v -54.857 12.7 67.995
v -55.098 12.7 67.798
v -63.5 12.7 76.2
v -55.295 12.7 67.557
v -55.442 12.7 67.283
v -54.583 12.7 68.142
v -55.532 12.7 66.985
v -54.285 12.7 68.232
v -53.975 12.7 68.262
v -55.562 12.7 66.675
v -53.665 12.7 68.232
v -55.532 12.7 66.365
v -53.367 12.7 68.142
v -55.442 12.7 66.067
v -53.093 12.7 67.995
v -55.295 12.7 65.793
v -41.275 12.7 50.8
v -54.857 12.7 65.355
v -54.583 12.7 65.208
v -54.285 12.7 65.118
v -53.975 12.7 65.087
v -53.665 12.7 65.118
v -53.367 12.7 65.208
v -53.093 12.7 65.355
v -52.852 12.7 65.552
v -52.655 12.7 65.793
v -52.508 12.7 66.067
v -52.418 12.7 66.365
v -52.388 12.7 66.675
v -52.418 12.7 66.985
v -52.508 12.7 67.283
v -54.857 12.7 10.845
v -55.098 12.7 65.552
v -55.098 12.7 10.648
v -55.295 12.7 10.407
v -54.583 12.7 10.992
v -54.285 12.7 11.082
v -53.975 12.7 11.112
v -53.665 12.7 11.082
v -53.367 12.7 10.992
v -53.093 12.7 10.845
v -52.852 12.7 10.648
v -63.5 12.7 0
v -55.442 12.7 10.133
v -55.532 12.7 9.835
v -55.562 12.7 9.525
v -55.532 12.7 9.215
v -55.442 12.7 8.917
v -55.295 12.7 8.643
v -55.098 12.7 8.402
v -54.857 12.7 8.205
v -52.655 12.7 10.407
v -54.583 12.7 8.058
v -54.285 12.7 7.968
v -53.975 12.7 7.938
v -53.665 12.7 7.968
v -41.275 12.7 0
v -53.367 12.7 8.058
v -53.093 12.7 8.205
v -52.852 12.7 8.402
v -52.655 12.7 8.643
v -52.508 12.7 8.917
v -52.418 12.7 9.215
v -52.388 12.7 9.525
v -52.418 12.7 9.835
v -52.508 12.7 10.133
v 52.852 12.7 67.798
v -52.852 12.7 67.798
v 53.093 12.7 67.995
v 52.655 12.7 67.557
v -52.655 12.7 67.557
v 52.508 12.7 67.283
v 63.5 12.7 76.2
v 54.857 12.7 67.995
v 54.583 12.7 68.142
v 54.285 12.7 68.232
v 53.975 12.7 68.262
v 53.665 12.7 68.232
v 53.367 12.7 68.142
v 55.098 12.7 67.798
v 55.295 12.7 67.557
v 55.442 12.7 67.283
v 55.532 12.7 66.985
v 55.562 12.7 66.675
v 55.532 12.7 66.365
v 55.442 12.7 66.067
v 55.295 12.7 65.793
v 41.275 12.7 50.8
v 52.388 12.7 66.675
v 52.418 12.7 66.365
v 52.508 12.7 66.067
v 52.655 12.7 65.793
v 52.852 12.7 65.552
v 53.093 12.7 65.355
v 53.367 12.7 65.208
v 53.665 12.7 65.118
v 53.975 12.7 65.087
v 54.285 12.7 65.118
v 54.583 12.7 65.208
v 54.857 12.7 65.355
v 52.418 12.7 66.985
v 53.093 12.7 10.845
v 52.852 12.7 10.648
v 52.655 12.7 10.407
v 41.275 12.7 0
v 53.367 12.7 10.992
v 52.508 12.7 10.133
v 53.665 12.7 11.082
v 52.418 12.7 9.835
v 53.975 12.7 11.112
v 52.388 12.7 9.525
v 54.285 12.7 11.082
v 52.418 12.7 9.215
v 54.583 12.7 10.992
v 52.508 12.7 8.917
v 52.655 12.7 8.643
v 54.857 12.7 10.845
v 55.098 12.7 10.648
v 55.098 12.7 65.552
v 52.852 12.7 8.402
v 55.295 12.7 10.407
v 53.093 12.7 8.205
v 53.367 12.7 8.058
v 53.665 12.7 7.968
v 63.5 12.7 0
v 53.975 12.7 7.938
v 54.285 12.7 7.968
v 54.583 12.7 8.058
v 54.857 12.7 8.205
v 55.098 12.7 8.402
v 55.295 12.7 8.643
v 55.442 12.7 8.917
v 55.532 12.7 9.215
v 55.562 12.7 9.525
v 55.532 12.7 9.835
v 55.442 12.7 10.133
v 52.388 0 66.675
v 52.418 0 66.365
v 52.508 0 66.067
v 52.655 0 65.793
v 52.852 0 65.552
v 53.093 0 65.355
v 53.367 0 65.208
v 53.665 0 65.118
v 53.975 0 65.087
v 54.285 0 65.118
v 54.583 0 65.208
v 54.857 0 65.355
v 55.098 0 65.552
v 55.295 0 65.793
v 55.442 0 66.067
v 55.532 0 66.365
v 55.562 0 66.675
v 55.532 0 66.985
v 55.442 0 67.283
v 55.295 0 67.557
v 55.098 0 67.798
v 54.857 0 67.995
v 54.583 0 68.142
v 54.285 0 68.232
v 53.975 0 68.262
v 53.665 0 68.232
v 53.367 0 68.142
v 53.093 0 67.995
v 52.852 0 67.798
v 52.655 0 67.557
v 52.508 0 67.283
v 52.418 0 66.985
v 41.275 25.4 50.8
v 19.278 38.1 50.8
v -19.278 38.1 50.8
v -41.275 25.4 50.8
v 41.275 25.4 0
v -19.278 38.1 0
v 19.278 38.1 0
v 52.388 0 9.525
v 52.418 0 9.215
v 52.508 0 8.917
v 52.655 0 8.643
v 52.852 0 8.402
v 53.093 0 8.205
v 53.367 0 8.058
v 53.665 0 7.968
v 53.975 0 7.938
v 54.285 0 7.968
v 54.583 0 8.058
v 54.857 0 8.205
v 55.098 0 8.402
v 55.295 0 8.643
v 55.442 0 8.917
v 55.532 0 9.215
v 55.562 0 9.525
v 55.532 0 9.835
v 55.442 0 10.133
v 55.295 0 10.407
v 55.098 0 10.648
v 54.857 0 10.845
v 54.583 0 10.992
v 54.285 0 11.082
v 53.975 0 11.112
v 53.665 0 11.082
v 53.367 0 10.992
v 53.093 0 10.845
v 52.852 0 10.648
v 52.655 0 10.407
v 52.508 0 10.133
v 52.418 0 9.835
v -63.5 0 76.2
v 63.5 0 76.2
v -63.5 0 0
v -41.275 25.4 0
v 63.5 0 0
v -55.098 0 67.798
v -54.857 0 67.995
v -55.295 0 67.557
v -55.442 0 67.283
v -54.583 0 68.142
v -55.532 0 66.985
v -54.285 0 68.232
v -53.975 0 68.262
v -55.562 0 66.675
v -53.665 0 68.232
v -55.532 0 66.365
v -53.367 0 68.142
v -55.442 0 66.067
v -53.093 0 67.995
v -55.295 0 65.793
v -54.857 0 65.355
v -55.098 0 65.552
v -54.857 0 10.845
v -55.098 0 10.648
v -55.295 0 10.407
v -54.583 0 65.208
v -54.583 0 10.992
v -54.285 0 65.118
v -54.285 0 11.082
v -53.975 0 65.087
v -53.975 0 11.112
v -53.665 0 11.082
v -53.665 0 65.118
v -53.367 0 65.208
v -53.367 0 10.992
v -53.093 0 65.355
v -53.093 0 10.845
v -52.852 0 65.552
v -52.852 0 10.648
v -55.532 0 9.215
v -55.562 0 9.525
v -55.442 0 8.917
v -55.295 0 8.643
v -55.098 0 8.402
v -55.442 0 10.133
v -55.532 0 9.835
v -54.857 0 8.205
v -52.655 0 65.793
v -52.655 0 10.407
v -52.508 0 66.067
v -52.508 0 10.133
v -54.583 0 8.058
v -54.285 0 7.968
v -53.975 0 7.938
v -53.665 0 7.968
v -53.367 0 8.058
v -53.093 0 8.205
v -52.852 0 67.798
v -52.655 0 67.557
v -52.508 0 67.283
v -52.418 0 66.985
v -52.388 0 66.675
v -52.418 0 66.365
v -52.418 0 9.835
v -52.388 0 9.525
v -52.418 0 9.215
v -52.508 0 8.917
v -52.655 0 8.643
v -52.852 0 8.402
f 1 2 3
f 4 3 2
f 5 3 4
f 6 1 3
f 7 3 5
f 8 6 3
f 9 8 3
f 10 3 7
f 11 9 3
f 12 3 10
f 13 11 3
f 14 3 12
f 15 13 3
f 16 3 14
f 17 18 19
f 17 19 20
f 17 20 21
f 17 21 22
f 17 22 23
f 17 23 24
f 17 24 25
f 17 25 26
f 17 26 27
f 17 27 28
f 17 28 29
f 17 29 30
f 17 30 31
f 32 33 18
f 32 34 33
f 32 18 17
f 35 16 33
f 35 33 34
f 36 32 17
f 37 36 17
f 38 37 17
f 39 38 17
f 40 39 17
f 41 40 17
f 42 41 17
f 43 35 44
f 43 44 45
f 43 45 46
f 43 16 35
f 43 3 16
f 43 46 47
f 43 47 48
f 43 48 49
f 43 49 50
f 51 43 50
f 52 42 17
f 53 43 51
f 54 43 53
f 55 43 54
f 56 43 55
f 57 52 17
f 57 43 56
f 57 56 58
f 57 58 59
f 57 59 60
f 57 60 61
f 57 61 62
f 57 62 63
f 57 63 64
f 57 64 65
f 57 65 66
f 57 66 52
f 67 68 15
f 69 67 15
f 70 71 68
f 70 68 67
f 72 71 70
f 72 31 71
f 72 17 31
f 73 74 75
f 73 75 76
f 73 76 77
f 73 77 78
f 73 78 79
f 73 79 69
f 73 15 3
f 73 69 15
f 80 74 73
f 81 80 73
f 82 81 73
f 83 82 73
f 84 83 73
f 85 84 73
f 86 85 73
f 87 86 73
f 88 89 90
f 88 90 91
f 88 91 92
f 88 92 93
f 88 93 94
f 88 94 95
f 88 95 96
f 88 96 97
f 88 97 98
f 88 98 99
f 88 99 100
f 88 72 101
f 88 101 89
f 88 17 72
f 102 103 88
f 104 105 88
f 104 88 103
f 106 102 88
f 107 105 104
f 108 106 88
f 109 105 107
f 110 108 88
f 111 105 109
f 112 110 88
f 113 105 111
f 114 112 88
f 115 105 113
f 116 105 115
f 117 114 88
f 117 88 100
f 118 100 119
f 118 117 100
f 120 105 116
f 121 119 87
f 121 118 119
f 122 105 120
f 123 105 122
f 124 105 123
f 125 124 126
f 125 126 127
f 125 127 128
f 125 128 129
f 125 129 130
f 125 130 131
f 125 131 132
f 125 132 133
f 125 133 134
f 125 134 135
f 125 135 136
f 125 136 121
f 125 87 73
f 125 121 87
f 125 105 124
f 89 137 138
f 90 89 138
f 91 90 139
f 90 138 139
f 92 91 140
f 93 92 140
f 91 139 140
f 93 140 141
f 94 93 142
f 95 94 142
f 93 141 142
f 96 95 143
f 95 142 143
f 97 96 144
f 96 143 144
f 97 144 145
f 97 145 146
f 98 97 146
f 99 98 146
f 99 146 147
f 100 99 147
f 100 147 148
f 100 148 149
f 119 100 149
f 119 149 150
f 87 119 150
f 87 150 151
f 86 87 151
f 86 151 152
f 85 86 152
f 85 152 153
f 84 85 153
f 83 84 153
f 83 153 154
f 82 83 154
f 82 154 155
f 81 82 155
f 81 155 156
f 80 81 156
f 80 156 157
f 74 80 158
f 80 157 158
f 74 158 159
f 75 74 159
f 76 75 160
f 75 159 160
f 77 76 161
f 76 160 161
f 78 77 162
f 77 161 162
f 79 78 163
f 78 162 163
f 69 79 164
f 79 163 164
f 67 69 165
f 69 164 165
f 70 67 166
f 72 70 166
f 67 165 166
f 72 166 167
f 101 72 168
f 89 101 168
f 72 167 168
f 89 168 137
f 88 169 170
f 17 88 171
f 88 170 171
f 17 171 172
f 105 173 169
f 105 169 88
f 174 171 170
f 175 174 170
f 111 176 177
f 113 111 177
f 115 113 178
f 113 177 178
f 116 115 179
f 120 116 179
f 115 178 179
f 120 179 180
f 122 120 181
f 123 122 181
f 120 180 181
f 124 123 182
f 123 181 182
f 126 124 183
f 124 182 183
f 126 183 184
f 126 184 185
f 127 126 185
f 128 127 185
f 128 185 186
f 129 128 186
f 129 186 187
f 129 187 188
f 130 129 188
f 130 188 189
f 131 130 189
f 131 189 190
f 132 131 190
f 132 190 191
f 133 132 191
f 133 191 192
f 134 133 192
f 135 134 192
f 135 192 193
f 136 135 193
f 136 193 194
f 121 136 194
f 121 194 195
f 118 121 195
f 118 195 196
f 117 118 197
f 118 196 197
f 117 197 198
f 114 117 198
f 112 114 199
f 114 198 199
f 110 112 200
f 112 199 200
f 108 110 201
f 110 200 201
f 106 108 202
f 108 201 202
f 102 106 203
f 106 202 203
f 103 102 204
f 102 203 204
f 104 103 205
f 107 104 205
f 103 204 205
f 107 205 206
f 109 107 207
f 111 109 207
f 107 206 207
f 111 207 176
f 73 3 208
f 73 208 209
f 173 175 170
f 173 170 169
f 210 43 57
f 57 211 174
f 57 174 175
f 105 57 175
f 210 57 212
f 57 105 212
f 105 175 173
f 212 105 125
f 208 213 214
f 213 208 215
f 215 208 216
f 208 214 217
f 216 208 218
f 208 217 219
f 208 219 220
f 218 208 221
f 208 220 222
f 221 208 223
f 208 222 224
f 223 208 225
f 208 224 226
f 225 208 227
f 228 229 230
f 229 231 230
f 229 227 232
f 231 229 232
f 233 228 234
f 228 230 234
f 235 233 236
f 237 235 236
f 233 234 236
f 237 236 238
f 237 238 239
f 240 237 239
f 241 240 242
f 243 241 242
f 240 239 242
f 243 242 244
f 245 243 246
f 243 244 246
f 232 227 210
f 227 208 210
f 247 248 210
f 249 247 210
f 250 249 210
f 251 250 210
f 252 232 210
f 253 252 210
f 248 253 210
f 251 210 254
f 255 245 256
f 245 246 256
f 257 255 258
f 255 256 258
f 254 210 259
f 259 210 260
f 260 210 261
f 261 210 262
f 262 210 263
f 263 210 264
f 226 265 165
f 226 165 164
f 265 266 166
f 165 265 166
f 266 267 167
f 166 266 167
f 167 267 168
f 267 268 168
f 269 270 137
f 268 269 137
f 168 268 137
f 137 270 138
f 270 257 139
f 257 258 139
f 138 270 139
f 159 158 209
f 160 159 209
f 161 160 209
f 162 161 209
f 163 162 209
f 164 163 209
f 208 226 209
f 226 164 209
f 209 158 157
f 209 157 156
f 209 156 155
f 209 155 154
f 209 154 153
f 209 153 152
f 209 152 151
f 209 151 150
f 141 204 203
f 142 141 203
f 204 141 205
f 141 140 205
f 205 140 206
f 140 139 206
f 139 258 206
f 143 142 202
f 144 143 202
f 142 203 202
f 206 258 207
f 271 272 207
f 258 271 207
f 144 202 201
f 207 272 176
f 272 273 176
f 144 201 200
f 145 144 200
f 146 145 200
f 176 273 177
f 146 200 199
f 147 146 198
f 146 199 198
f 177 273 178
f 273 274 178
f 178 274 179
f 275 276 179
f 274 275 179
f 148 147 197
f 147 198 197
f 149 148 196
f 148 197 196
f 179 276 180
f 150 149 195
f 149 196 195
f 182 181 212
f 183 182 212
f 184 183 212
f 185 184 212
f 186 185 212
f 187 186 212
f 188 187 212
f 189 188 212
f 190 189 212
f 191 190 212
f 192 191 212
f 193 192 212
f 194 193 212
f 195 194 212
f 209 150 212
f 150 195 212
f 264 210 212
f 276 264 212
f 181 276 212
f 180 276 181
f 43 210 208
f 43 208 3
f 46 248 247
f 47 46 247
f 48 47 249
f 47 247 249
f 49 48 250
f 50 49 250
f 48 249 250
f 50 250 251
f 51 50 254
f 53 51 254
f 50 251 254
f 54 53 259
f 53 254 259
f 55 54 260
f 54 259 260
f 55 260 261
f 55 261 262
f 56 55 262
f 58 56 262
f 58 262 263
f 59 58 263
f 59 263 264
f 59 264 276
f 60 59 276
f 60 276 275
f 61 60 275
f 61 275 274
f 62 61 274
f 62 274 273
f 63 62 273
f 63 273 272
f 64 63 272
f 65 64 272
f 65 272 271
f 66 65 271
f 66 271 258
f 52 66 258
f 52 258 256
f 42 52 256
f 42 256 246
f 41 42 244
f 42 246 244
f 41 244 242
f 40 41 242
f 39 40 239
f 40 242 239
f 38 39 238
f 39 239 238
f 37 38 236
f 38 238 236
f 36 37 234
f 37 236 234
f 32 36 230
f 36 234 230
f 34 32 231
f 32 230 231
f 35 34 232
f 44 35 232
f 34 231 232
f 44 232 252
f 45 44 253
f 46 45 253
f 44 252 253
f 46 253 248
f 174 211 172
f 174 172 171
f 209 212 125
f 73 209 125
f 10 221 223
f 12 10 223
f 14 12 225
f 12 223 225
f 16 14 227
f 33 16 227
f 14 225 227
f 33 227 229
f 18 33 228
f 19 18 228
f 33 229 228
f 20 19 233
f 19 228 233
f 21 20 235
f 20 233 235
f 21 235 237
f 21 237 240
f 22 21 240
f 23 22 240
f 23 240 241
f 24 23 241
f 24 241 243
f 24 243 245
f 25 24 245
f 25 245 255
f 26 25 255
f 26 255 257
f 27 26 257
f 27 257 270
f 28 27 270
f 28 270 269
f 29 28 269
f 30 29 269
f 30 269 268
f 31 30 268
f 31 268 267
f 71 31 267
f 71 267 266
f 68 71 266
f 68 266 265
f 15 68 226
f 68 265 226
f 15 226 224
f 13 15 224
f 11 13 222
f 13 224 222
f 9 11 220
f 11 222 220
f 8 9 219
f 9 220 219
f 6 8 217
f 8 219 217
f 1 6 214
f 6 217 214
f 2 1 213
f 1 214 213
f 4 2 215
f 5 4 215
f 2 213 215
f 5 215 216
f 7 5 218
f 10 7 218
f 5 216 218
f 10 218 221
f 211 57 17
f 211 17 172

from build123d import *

# Parameters (mm, degrees)
SKETCH1_W                    = 127
SKETCH1_H                    = 12.7
BOSS_EXTRUDE1_DEPTH          = 76.2
BOSS_EXTRUDE3_DEPTH          = 50.8
F_1_8_0_125_DIAMETER_HOLE1_D = 3.175


with BuildPart() as part:
    # Sketch1 → Boss-Extrude1 (new body)
    with BuildSketch(Plane.XY):
        with Locations((0, 6.35)):
            Rectangle(SKETCH1_W, SKETCH1_H)
    extrude(amount=BOSS_EXTRUDE1_DEPTH)

    # Sketch2 → Boss-Extrude3 (add)
    with BuildSketch(Plane(origin=(0, 0, 0), x_dir=(-1, 0, 0), z_dir=(0, 0, -1))):
        Polygon((-41.275, 12.7), (41.275, 12.7), (41.275, 25.4), (19.277954744, 38.1), (-19.277954744, 38.1), (-41.275, 25.4), align=None)
    extrude(amount=-BOSS_EXTRUDE3_DEPTH)

    # 1/8 (0.125) Diameter Hole1 (through all)
    with Locations(Plane(origin=(0, 12.7, 0), x_dir=(1, 0, 0), z_dir=(0, 1, 0))):
        with Locations((53.975, -9.525), (-53.975, -9.525), (-53.975, -66.675), (53.975, -66.675)):
            Hole(F_1_8_0_125_DIAMETER_HOLE1_D / 2)


solid = part.part
